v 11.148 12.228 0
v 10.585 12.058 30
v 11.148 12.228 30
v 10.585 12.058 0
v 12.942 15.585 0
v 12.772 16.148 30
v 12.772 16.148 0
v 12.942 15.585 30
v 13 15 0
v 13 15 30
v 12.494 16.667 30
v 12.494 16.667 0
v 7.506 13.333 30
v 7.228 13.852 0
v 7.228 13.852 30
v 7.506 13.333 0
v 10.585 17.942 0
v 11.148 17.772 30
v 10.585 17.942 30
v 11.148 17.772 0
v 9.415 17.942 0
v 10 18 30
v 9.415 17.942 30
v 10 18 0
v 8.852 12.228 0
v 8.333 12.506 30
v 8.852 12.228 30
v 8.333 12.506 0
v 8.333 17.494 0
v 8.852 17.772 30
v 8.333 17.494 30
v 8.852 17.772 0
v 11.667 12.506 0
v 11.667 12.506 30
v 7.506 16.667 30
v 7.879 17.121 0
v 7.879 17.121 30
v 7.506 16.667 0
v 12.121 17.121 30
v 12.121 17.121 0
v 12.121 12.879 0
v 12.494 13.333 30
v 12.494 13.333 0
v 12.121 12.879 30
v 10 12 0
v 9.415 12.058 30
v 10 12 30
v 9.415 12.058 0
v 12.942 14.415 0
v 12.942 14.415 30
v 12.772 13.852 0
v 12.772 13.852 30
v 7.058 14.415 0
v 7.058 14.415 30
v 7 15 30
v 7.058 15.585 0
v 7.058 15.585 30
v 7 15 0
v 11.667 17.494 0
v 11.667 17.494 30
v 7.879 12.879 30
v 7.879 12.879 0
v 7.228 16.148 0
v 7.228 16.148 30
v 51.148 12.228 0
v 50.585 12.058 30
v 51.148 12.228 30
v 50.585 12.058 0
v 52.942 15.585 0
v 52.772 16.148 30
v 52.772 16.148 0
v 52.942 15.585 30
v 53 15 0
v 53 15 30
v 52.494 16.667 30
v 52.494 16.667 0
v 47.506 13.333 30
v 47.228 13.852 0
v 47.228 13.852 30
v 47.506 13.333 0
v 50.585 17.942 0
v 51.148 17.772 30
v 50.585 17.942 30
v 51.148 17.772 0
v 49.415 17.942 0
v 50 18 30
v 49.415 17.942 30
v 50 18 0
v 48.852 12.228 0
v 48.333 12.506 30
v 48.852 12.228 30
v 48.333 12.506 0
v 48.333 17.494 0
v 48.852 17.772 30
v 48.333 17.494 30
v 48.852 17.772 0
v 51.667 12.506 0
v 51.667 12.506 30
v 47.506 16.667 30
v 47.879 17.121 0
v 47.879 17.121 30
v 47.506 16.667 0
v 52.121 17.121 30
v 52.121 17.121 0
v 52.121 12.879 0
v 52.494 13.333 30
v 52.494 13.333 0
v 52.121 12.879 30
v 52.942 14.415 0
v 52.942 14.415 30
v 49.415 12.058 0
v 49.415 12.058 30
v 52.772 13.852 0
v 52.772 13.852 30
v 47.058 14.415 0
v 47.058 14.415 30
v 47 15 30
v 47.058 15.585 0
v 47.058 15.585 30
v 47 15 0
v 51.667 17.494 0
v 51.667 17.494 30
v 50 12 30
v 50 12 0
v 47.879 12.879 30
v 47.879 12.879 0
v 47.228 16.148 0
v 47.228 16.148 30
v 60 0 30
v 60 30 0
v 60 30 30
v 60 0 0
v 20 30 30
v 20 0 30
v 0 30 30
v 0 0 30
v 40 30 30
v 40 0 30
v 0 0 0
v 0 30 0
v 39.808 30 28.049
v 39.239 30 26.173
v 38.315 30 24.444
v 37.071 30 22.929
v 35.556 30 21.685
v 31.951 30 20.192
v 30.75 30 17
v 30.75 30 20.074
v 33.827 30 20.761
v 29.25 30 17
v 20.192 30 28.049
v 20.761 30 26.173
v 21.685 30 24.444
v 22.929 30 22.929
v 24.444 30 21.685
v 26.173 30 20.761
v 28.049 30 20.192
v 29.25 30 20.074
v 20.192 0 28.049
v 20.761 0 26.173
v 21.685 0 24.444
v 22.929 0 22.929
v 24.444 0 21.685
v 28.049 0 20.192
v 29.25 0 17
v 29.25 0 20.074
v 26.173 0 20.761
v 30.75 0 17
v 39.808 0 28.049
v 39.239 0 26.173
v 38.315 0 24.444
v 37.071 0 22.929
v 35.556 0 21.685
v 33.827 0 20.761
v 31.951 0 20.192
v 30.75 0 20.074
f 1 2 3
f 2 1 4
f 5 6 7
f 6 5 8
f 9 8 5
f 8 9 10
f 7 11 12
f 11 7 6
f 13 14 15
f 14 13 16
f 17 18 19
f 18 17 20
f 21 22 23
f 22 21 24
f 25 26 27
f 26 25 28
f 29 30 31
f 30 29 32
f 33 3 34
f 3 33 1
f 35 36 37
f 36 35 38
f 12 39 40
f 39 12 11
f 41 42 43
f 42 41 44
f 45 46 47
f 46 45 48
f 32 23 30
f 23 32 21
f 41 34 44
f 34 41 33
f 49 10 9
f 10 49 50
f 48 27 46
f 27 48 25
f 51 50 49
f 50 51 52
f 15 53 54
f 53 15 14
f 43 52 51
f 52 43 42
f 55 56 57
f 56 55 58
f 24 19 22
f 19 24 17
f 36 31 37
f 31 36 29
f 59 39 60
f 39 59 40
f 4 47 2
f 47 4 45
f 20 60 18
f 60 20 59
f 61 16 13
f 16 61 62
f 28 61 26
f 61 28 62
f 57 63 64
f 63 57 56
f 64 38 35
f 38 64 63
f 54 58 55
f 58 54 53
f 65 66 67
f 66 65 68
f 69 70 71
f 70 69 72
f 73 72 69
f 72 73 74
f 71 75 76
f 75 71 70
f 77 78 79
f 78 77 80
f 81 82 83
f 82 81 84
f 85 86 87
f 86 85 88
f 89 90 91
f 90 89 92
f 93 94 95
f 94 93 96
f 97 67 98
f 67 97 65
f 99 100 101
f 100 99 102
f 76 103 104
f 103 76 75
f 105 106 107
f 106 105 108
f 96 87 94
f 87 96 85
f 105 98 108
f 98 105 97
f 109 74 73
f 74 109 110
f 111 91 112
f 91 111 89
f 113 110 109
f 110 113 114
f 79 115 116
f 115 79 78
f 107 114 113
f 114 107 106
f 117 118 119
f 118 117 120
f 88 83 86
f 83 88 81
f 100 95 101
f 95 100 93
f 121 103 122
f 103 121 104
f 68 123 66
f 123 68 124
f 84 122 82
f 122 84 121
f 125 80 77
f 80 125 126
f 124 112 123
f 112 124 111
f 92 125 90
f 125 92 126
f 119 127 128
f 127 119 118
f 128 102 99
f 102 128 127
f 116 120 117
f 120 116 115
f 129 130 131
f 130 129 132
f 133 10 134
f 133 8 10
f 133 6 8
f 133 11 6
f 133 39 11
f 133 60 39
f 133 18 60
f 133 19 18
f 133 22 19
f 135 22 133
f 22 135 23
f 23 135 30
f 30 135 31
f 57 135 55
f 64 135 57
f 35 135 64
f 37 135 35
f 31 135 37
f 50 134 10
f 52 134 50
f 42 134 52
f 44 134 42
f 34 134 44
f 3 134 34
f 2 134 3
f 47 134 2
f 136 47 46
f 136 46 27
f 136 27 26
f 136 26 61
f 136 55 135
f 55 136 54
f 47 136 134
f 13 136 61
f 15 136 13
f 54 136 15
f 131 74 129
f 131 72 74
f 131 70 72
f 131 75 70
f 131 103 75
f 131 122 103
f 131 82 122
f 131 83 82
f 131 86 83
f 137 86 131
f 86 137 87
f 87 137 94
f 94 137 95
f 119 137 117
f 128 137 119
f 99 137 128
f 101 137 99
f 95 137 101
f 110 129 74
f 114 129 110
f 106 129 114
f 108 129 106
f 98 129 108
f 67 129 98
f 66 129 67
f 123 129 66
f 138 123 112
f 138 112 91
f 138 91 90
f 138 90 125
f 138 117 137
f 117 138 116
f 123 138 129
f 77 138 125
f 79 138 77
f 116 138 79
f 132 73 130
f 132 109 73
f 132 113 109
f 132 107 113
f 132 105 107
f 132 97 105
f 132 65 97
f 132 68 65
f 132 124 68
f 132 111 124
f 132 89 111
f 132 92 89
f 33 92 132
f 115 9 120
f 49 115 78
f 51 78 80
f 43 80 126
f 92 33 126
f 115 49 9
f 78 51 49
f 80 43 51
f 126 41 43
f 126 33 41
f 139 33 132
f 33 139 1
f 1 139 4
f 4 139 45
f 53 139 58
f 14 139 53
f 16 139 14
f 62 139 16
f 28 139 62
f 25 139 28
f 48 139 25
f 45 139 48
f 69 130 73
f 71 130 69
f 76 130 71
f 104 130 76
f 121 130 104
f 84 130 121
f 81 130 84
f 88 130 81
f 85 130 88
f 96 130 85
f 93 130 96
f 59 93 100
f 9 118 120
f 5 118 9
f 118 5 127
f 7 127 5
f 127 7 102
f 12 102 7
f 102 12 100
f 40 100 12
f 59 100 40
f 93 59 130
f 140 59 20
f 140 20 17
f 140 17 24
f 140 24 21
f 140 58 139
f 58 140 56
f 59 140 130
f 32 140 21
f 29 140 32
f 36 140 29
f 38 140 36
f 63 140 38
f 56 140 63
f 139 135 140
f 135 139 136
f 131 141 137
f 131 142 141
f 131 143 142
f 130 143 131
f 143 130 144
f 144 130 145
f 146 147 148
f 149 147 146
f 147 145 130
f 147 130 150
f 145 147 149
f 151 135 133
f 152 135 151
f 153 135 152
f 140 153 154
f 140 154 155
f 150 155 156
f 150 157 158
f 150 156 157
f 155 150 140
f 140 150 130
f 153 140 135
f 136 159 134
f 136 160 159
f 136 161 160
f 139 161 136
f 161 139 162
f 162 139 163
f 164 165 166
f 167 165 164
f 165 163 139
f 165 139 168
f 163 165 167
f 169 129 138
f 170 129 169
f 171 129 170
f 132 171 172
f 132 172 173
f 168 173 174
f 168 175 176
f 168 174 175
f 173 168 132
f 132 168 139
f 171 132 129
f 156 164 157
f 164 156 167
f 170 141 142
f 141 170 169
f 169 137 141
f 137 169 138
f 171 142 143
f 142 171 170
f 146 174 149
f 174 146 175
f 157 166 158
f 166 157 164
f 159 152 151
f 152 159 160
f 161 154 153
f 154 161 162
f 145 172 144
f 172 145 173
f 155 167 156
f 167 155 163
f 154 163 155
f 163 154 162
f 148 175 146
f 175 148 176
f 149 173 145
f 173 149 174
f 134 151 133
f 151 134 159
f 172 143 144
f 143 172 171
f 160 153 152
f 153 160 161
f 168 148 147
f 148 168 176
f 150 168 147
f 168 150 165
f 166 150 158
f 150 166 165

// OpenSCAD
$fn = 32;

// ----------------------------------------------------------------------
// Saddle clamp: split shaft clamp
// ----------------------------------------------------------------------

// --- parameters (mm) ---
blk_l = 60;               // block length, X
blk_w = 30;               // block width, Y
blk_h = 30;               // block height
clamp_r = 10;             // shaft groove radius
hole_r = 3;               // bolt hole radius
hole_m = 10;              // bolt hole margin from the ends
saw_w = 1.5;              // saw kerf width

saw_depth = clamp_r + 3;  // saw kerf depth

difference() {
  cube([blk_l, blk_w, blk_h]);
  translate([blk_l / 2, -1, blk_h])
    rotate([-90, 0, 0])
      cylinder(h = blk_w + 2, r = clamp_r);
  for (sx = [0, 1])
    translate([sx ? blk_l - hole_m : hole_m, blk_w / 2, -1])
      cylinder(r = hole_r, h = blk_h + 2);
  translate([blk_l / 2 - saw_w / 2, -1, blk_h - saw_depth])
    cube([saw_w, blk_w + 2, saw_depth + 1]);
}
